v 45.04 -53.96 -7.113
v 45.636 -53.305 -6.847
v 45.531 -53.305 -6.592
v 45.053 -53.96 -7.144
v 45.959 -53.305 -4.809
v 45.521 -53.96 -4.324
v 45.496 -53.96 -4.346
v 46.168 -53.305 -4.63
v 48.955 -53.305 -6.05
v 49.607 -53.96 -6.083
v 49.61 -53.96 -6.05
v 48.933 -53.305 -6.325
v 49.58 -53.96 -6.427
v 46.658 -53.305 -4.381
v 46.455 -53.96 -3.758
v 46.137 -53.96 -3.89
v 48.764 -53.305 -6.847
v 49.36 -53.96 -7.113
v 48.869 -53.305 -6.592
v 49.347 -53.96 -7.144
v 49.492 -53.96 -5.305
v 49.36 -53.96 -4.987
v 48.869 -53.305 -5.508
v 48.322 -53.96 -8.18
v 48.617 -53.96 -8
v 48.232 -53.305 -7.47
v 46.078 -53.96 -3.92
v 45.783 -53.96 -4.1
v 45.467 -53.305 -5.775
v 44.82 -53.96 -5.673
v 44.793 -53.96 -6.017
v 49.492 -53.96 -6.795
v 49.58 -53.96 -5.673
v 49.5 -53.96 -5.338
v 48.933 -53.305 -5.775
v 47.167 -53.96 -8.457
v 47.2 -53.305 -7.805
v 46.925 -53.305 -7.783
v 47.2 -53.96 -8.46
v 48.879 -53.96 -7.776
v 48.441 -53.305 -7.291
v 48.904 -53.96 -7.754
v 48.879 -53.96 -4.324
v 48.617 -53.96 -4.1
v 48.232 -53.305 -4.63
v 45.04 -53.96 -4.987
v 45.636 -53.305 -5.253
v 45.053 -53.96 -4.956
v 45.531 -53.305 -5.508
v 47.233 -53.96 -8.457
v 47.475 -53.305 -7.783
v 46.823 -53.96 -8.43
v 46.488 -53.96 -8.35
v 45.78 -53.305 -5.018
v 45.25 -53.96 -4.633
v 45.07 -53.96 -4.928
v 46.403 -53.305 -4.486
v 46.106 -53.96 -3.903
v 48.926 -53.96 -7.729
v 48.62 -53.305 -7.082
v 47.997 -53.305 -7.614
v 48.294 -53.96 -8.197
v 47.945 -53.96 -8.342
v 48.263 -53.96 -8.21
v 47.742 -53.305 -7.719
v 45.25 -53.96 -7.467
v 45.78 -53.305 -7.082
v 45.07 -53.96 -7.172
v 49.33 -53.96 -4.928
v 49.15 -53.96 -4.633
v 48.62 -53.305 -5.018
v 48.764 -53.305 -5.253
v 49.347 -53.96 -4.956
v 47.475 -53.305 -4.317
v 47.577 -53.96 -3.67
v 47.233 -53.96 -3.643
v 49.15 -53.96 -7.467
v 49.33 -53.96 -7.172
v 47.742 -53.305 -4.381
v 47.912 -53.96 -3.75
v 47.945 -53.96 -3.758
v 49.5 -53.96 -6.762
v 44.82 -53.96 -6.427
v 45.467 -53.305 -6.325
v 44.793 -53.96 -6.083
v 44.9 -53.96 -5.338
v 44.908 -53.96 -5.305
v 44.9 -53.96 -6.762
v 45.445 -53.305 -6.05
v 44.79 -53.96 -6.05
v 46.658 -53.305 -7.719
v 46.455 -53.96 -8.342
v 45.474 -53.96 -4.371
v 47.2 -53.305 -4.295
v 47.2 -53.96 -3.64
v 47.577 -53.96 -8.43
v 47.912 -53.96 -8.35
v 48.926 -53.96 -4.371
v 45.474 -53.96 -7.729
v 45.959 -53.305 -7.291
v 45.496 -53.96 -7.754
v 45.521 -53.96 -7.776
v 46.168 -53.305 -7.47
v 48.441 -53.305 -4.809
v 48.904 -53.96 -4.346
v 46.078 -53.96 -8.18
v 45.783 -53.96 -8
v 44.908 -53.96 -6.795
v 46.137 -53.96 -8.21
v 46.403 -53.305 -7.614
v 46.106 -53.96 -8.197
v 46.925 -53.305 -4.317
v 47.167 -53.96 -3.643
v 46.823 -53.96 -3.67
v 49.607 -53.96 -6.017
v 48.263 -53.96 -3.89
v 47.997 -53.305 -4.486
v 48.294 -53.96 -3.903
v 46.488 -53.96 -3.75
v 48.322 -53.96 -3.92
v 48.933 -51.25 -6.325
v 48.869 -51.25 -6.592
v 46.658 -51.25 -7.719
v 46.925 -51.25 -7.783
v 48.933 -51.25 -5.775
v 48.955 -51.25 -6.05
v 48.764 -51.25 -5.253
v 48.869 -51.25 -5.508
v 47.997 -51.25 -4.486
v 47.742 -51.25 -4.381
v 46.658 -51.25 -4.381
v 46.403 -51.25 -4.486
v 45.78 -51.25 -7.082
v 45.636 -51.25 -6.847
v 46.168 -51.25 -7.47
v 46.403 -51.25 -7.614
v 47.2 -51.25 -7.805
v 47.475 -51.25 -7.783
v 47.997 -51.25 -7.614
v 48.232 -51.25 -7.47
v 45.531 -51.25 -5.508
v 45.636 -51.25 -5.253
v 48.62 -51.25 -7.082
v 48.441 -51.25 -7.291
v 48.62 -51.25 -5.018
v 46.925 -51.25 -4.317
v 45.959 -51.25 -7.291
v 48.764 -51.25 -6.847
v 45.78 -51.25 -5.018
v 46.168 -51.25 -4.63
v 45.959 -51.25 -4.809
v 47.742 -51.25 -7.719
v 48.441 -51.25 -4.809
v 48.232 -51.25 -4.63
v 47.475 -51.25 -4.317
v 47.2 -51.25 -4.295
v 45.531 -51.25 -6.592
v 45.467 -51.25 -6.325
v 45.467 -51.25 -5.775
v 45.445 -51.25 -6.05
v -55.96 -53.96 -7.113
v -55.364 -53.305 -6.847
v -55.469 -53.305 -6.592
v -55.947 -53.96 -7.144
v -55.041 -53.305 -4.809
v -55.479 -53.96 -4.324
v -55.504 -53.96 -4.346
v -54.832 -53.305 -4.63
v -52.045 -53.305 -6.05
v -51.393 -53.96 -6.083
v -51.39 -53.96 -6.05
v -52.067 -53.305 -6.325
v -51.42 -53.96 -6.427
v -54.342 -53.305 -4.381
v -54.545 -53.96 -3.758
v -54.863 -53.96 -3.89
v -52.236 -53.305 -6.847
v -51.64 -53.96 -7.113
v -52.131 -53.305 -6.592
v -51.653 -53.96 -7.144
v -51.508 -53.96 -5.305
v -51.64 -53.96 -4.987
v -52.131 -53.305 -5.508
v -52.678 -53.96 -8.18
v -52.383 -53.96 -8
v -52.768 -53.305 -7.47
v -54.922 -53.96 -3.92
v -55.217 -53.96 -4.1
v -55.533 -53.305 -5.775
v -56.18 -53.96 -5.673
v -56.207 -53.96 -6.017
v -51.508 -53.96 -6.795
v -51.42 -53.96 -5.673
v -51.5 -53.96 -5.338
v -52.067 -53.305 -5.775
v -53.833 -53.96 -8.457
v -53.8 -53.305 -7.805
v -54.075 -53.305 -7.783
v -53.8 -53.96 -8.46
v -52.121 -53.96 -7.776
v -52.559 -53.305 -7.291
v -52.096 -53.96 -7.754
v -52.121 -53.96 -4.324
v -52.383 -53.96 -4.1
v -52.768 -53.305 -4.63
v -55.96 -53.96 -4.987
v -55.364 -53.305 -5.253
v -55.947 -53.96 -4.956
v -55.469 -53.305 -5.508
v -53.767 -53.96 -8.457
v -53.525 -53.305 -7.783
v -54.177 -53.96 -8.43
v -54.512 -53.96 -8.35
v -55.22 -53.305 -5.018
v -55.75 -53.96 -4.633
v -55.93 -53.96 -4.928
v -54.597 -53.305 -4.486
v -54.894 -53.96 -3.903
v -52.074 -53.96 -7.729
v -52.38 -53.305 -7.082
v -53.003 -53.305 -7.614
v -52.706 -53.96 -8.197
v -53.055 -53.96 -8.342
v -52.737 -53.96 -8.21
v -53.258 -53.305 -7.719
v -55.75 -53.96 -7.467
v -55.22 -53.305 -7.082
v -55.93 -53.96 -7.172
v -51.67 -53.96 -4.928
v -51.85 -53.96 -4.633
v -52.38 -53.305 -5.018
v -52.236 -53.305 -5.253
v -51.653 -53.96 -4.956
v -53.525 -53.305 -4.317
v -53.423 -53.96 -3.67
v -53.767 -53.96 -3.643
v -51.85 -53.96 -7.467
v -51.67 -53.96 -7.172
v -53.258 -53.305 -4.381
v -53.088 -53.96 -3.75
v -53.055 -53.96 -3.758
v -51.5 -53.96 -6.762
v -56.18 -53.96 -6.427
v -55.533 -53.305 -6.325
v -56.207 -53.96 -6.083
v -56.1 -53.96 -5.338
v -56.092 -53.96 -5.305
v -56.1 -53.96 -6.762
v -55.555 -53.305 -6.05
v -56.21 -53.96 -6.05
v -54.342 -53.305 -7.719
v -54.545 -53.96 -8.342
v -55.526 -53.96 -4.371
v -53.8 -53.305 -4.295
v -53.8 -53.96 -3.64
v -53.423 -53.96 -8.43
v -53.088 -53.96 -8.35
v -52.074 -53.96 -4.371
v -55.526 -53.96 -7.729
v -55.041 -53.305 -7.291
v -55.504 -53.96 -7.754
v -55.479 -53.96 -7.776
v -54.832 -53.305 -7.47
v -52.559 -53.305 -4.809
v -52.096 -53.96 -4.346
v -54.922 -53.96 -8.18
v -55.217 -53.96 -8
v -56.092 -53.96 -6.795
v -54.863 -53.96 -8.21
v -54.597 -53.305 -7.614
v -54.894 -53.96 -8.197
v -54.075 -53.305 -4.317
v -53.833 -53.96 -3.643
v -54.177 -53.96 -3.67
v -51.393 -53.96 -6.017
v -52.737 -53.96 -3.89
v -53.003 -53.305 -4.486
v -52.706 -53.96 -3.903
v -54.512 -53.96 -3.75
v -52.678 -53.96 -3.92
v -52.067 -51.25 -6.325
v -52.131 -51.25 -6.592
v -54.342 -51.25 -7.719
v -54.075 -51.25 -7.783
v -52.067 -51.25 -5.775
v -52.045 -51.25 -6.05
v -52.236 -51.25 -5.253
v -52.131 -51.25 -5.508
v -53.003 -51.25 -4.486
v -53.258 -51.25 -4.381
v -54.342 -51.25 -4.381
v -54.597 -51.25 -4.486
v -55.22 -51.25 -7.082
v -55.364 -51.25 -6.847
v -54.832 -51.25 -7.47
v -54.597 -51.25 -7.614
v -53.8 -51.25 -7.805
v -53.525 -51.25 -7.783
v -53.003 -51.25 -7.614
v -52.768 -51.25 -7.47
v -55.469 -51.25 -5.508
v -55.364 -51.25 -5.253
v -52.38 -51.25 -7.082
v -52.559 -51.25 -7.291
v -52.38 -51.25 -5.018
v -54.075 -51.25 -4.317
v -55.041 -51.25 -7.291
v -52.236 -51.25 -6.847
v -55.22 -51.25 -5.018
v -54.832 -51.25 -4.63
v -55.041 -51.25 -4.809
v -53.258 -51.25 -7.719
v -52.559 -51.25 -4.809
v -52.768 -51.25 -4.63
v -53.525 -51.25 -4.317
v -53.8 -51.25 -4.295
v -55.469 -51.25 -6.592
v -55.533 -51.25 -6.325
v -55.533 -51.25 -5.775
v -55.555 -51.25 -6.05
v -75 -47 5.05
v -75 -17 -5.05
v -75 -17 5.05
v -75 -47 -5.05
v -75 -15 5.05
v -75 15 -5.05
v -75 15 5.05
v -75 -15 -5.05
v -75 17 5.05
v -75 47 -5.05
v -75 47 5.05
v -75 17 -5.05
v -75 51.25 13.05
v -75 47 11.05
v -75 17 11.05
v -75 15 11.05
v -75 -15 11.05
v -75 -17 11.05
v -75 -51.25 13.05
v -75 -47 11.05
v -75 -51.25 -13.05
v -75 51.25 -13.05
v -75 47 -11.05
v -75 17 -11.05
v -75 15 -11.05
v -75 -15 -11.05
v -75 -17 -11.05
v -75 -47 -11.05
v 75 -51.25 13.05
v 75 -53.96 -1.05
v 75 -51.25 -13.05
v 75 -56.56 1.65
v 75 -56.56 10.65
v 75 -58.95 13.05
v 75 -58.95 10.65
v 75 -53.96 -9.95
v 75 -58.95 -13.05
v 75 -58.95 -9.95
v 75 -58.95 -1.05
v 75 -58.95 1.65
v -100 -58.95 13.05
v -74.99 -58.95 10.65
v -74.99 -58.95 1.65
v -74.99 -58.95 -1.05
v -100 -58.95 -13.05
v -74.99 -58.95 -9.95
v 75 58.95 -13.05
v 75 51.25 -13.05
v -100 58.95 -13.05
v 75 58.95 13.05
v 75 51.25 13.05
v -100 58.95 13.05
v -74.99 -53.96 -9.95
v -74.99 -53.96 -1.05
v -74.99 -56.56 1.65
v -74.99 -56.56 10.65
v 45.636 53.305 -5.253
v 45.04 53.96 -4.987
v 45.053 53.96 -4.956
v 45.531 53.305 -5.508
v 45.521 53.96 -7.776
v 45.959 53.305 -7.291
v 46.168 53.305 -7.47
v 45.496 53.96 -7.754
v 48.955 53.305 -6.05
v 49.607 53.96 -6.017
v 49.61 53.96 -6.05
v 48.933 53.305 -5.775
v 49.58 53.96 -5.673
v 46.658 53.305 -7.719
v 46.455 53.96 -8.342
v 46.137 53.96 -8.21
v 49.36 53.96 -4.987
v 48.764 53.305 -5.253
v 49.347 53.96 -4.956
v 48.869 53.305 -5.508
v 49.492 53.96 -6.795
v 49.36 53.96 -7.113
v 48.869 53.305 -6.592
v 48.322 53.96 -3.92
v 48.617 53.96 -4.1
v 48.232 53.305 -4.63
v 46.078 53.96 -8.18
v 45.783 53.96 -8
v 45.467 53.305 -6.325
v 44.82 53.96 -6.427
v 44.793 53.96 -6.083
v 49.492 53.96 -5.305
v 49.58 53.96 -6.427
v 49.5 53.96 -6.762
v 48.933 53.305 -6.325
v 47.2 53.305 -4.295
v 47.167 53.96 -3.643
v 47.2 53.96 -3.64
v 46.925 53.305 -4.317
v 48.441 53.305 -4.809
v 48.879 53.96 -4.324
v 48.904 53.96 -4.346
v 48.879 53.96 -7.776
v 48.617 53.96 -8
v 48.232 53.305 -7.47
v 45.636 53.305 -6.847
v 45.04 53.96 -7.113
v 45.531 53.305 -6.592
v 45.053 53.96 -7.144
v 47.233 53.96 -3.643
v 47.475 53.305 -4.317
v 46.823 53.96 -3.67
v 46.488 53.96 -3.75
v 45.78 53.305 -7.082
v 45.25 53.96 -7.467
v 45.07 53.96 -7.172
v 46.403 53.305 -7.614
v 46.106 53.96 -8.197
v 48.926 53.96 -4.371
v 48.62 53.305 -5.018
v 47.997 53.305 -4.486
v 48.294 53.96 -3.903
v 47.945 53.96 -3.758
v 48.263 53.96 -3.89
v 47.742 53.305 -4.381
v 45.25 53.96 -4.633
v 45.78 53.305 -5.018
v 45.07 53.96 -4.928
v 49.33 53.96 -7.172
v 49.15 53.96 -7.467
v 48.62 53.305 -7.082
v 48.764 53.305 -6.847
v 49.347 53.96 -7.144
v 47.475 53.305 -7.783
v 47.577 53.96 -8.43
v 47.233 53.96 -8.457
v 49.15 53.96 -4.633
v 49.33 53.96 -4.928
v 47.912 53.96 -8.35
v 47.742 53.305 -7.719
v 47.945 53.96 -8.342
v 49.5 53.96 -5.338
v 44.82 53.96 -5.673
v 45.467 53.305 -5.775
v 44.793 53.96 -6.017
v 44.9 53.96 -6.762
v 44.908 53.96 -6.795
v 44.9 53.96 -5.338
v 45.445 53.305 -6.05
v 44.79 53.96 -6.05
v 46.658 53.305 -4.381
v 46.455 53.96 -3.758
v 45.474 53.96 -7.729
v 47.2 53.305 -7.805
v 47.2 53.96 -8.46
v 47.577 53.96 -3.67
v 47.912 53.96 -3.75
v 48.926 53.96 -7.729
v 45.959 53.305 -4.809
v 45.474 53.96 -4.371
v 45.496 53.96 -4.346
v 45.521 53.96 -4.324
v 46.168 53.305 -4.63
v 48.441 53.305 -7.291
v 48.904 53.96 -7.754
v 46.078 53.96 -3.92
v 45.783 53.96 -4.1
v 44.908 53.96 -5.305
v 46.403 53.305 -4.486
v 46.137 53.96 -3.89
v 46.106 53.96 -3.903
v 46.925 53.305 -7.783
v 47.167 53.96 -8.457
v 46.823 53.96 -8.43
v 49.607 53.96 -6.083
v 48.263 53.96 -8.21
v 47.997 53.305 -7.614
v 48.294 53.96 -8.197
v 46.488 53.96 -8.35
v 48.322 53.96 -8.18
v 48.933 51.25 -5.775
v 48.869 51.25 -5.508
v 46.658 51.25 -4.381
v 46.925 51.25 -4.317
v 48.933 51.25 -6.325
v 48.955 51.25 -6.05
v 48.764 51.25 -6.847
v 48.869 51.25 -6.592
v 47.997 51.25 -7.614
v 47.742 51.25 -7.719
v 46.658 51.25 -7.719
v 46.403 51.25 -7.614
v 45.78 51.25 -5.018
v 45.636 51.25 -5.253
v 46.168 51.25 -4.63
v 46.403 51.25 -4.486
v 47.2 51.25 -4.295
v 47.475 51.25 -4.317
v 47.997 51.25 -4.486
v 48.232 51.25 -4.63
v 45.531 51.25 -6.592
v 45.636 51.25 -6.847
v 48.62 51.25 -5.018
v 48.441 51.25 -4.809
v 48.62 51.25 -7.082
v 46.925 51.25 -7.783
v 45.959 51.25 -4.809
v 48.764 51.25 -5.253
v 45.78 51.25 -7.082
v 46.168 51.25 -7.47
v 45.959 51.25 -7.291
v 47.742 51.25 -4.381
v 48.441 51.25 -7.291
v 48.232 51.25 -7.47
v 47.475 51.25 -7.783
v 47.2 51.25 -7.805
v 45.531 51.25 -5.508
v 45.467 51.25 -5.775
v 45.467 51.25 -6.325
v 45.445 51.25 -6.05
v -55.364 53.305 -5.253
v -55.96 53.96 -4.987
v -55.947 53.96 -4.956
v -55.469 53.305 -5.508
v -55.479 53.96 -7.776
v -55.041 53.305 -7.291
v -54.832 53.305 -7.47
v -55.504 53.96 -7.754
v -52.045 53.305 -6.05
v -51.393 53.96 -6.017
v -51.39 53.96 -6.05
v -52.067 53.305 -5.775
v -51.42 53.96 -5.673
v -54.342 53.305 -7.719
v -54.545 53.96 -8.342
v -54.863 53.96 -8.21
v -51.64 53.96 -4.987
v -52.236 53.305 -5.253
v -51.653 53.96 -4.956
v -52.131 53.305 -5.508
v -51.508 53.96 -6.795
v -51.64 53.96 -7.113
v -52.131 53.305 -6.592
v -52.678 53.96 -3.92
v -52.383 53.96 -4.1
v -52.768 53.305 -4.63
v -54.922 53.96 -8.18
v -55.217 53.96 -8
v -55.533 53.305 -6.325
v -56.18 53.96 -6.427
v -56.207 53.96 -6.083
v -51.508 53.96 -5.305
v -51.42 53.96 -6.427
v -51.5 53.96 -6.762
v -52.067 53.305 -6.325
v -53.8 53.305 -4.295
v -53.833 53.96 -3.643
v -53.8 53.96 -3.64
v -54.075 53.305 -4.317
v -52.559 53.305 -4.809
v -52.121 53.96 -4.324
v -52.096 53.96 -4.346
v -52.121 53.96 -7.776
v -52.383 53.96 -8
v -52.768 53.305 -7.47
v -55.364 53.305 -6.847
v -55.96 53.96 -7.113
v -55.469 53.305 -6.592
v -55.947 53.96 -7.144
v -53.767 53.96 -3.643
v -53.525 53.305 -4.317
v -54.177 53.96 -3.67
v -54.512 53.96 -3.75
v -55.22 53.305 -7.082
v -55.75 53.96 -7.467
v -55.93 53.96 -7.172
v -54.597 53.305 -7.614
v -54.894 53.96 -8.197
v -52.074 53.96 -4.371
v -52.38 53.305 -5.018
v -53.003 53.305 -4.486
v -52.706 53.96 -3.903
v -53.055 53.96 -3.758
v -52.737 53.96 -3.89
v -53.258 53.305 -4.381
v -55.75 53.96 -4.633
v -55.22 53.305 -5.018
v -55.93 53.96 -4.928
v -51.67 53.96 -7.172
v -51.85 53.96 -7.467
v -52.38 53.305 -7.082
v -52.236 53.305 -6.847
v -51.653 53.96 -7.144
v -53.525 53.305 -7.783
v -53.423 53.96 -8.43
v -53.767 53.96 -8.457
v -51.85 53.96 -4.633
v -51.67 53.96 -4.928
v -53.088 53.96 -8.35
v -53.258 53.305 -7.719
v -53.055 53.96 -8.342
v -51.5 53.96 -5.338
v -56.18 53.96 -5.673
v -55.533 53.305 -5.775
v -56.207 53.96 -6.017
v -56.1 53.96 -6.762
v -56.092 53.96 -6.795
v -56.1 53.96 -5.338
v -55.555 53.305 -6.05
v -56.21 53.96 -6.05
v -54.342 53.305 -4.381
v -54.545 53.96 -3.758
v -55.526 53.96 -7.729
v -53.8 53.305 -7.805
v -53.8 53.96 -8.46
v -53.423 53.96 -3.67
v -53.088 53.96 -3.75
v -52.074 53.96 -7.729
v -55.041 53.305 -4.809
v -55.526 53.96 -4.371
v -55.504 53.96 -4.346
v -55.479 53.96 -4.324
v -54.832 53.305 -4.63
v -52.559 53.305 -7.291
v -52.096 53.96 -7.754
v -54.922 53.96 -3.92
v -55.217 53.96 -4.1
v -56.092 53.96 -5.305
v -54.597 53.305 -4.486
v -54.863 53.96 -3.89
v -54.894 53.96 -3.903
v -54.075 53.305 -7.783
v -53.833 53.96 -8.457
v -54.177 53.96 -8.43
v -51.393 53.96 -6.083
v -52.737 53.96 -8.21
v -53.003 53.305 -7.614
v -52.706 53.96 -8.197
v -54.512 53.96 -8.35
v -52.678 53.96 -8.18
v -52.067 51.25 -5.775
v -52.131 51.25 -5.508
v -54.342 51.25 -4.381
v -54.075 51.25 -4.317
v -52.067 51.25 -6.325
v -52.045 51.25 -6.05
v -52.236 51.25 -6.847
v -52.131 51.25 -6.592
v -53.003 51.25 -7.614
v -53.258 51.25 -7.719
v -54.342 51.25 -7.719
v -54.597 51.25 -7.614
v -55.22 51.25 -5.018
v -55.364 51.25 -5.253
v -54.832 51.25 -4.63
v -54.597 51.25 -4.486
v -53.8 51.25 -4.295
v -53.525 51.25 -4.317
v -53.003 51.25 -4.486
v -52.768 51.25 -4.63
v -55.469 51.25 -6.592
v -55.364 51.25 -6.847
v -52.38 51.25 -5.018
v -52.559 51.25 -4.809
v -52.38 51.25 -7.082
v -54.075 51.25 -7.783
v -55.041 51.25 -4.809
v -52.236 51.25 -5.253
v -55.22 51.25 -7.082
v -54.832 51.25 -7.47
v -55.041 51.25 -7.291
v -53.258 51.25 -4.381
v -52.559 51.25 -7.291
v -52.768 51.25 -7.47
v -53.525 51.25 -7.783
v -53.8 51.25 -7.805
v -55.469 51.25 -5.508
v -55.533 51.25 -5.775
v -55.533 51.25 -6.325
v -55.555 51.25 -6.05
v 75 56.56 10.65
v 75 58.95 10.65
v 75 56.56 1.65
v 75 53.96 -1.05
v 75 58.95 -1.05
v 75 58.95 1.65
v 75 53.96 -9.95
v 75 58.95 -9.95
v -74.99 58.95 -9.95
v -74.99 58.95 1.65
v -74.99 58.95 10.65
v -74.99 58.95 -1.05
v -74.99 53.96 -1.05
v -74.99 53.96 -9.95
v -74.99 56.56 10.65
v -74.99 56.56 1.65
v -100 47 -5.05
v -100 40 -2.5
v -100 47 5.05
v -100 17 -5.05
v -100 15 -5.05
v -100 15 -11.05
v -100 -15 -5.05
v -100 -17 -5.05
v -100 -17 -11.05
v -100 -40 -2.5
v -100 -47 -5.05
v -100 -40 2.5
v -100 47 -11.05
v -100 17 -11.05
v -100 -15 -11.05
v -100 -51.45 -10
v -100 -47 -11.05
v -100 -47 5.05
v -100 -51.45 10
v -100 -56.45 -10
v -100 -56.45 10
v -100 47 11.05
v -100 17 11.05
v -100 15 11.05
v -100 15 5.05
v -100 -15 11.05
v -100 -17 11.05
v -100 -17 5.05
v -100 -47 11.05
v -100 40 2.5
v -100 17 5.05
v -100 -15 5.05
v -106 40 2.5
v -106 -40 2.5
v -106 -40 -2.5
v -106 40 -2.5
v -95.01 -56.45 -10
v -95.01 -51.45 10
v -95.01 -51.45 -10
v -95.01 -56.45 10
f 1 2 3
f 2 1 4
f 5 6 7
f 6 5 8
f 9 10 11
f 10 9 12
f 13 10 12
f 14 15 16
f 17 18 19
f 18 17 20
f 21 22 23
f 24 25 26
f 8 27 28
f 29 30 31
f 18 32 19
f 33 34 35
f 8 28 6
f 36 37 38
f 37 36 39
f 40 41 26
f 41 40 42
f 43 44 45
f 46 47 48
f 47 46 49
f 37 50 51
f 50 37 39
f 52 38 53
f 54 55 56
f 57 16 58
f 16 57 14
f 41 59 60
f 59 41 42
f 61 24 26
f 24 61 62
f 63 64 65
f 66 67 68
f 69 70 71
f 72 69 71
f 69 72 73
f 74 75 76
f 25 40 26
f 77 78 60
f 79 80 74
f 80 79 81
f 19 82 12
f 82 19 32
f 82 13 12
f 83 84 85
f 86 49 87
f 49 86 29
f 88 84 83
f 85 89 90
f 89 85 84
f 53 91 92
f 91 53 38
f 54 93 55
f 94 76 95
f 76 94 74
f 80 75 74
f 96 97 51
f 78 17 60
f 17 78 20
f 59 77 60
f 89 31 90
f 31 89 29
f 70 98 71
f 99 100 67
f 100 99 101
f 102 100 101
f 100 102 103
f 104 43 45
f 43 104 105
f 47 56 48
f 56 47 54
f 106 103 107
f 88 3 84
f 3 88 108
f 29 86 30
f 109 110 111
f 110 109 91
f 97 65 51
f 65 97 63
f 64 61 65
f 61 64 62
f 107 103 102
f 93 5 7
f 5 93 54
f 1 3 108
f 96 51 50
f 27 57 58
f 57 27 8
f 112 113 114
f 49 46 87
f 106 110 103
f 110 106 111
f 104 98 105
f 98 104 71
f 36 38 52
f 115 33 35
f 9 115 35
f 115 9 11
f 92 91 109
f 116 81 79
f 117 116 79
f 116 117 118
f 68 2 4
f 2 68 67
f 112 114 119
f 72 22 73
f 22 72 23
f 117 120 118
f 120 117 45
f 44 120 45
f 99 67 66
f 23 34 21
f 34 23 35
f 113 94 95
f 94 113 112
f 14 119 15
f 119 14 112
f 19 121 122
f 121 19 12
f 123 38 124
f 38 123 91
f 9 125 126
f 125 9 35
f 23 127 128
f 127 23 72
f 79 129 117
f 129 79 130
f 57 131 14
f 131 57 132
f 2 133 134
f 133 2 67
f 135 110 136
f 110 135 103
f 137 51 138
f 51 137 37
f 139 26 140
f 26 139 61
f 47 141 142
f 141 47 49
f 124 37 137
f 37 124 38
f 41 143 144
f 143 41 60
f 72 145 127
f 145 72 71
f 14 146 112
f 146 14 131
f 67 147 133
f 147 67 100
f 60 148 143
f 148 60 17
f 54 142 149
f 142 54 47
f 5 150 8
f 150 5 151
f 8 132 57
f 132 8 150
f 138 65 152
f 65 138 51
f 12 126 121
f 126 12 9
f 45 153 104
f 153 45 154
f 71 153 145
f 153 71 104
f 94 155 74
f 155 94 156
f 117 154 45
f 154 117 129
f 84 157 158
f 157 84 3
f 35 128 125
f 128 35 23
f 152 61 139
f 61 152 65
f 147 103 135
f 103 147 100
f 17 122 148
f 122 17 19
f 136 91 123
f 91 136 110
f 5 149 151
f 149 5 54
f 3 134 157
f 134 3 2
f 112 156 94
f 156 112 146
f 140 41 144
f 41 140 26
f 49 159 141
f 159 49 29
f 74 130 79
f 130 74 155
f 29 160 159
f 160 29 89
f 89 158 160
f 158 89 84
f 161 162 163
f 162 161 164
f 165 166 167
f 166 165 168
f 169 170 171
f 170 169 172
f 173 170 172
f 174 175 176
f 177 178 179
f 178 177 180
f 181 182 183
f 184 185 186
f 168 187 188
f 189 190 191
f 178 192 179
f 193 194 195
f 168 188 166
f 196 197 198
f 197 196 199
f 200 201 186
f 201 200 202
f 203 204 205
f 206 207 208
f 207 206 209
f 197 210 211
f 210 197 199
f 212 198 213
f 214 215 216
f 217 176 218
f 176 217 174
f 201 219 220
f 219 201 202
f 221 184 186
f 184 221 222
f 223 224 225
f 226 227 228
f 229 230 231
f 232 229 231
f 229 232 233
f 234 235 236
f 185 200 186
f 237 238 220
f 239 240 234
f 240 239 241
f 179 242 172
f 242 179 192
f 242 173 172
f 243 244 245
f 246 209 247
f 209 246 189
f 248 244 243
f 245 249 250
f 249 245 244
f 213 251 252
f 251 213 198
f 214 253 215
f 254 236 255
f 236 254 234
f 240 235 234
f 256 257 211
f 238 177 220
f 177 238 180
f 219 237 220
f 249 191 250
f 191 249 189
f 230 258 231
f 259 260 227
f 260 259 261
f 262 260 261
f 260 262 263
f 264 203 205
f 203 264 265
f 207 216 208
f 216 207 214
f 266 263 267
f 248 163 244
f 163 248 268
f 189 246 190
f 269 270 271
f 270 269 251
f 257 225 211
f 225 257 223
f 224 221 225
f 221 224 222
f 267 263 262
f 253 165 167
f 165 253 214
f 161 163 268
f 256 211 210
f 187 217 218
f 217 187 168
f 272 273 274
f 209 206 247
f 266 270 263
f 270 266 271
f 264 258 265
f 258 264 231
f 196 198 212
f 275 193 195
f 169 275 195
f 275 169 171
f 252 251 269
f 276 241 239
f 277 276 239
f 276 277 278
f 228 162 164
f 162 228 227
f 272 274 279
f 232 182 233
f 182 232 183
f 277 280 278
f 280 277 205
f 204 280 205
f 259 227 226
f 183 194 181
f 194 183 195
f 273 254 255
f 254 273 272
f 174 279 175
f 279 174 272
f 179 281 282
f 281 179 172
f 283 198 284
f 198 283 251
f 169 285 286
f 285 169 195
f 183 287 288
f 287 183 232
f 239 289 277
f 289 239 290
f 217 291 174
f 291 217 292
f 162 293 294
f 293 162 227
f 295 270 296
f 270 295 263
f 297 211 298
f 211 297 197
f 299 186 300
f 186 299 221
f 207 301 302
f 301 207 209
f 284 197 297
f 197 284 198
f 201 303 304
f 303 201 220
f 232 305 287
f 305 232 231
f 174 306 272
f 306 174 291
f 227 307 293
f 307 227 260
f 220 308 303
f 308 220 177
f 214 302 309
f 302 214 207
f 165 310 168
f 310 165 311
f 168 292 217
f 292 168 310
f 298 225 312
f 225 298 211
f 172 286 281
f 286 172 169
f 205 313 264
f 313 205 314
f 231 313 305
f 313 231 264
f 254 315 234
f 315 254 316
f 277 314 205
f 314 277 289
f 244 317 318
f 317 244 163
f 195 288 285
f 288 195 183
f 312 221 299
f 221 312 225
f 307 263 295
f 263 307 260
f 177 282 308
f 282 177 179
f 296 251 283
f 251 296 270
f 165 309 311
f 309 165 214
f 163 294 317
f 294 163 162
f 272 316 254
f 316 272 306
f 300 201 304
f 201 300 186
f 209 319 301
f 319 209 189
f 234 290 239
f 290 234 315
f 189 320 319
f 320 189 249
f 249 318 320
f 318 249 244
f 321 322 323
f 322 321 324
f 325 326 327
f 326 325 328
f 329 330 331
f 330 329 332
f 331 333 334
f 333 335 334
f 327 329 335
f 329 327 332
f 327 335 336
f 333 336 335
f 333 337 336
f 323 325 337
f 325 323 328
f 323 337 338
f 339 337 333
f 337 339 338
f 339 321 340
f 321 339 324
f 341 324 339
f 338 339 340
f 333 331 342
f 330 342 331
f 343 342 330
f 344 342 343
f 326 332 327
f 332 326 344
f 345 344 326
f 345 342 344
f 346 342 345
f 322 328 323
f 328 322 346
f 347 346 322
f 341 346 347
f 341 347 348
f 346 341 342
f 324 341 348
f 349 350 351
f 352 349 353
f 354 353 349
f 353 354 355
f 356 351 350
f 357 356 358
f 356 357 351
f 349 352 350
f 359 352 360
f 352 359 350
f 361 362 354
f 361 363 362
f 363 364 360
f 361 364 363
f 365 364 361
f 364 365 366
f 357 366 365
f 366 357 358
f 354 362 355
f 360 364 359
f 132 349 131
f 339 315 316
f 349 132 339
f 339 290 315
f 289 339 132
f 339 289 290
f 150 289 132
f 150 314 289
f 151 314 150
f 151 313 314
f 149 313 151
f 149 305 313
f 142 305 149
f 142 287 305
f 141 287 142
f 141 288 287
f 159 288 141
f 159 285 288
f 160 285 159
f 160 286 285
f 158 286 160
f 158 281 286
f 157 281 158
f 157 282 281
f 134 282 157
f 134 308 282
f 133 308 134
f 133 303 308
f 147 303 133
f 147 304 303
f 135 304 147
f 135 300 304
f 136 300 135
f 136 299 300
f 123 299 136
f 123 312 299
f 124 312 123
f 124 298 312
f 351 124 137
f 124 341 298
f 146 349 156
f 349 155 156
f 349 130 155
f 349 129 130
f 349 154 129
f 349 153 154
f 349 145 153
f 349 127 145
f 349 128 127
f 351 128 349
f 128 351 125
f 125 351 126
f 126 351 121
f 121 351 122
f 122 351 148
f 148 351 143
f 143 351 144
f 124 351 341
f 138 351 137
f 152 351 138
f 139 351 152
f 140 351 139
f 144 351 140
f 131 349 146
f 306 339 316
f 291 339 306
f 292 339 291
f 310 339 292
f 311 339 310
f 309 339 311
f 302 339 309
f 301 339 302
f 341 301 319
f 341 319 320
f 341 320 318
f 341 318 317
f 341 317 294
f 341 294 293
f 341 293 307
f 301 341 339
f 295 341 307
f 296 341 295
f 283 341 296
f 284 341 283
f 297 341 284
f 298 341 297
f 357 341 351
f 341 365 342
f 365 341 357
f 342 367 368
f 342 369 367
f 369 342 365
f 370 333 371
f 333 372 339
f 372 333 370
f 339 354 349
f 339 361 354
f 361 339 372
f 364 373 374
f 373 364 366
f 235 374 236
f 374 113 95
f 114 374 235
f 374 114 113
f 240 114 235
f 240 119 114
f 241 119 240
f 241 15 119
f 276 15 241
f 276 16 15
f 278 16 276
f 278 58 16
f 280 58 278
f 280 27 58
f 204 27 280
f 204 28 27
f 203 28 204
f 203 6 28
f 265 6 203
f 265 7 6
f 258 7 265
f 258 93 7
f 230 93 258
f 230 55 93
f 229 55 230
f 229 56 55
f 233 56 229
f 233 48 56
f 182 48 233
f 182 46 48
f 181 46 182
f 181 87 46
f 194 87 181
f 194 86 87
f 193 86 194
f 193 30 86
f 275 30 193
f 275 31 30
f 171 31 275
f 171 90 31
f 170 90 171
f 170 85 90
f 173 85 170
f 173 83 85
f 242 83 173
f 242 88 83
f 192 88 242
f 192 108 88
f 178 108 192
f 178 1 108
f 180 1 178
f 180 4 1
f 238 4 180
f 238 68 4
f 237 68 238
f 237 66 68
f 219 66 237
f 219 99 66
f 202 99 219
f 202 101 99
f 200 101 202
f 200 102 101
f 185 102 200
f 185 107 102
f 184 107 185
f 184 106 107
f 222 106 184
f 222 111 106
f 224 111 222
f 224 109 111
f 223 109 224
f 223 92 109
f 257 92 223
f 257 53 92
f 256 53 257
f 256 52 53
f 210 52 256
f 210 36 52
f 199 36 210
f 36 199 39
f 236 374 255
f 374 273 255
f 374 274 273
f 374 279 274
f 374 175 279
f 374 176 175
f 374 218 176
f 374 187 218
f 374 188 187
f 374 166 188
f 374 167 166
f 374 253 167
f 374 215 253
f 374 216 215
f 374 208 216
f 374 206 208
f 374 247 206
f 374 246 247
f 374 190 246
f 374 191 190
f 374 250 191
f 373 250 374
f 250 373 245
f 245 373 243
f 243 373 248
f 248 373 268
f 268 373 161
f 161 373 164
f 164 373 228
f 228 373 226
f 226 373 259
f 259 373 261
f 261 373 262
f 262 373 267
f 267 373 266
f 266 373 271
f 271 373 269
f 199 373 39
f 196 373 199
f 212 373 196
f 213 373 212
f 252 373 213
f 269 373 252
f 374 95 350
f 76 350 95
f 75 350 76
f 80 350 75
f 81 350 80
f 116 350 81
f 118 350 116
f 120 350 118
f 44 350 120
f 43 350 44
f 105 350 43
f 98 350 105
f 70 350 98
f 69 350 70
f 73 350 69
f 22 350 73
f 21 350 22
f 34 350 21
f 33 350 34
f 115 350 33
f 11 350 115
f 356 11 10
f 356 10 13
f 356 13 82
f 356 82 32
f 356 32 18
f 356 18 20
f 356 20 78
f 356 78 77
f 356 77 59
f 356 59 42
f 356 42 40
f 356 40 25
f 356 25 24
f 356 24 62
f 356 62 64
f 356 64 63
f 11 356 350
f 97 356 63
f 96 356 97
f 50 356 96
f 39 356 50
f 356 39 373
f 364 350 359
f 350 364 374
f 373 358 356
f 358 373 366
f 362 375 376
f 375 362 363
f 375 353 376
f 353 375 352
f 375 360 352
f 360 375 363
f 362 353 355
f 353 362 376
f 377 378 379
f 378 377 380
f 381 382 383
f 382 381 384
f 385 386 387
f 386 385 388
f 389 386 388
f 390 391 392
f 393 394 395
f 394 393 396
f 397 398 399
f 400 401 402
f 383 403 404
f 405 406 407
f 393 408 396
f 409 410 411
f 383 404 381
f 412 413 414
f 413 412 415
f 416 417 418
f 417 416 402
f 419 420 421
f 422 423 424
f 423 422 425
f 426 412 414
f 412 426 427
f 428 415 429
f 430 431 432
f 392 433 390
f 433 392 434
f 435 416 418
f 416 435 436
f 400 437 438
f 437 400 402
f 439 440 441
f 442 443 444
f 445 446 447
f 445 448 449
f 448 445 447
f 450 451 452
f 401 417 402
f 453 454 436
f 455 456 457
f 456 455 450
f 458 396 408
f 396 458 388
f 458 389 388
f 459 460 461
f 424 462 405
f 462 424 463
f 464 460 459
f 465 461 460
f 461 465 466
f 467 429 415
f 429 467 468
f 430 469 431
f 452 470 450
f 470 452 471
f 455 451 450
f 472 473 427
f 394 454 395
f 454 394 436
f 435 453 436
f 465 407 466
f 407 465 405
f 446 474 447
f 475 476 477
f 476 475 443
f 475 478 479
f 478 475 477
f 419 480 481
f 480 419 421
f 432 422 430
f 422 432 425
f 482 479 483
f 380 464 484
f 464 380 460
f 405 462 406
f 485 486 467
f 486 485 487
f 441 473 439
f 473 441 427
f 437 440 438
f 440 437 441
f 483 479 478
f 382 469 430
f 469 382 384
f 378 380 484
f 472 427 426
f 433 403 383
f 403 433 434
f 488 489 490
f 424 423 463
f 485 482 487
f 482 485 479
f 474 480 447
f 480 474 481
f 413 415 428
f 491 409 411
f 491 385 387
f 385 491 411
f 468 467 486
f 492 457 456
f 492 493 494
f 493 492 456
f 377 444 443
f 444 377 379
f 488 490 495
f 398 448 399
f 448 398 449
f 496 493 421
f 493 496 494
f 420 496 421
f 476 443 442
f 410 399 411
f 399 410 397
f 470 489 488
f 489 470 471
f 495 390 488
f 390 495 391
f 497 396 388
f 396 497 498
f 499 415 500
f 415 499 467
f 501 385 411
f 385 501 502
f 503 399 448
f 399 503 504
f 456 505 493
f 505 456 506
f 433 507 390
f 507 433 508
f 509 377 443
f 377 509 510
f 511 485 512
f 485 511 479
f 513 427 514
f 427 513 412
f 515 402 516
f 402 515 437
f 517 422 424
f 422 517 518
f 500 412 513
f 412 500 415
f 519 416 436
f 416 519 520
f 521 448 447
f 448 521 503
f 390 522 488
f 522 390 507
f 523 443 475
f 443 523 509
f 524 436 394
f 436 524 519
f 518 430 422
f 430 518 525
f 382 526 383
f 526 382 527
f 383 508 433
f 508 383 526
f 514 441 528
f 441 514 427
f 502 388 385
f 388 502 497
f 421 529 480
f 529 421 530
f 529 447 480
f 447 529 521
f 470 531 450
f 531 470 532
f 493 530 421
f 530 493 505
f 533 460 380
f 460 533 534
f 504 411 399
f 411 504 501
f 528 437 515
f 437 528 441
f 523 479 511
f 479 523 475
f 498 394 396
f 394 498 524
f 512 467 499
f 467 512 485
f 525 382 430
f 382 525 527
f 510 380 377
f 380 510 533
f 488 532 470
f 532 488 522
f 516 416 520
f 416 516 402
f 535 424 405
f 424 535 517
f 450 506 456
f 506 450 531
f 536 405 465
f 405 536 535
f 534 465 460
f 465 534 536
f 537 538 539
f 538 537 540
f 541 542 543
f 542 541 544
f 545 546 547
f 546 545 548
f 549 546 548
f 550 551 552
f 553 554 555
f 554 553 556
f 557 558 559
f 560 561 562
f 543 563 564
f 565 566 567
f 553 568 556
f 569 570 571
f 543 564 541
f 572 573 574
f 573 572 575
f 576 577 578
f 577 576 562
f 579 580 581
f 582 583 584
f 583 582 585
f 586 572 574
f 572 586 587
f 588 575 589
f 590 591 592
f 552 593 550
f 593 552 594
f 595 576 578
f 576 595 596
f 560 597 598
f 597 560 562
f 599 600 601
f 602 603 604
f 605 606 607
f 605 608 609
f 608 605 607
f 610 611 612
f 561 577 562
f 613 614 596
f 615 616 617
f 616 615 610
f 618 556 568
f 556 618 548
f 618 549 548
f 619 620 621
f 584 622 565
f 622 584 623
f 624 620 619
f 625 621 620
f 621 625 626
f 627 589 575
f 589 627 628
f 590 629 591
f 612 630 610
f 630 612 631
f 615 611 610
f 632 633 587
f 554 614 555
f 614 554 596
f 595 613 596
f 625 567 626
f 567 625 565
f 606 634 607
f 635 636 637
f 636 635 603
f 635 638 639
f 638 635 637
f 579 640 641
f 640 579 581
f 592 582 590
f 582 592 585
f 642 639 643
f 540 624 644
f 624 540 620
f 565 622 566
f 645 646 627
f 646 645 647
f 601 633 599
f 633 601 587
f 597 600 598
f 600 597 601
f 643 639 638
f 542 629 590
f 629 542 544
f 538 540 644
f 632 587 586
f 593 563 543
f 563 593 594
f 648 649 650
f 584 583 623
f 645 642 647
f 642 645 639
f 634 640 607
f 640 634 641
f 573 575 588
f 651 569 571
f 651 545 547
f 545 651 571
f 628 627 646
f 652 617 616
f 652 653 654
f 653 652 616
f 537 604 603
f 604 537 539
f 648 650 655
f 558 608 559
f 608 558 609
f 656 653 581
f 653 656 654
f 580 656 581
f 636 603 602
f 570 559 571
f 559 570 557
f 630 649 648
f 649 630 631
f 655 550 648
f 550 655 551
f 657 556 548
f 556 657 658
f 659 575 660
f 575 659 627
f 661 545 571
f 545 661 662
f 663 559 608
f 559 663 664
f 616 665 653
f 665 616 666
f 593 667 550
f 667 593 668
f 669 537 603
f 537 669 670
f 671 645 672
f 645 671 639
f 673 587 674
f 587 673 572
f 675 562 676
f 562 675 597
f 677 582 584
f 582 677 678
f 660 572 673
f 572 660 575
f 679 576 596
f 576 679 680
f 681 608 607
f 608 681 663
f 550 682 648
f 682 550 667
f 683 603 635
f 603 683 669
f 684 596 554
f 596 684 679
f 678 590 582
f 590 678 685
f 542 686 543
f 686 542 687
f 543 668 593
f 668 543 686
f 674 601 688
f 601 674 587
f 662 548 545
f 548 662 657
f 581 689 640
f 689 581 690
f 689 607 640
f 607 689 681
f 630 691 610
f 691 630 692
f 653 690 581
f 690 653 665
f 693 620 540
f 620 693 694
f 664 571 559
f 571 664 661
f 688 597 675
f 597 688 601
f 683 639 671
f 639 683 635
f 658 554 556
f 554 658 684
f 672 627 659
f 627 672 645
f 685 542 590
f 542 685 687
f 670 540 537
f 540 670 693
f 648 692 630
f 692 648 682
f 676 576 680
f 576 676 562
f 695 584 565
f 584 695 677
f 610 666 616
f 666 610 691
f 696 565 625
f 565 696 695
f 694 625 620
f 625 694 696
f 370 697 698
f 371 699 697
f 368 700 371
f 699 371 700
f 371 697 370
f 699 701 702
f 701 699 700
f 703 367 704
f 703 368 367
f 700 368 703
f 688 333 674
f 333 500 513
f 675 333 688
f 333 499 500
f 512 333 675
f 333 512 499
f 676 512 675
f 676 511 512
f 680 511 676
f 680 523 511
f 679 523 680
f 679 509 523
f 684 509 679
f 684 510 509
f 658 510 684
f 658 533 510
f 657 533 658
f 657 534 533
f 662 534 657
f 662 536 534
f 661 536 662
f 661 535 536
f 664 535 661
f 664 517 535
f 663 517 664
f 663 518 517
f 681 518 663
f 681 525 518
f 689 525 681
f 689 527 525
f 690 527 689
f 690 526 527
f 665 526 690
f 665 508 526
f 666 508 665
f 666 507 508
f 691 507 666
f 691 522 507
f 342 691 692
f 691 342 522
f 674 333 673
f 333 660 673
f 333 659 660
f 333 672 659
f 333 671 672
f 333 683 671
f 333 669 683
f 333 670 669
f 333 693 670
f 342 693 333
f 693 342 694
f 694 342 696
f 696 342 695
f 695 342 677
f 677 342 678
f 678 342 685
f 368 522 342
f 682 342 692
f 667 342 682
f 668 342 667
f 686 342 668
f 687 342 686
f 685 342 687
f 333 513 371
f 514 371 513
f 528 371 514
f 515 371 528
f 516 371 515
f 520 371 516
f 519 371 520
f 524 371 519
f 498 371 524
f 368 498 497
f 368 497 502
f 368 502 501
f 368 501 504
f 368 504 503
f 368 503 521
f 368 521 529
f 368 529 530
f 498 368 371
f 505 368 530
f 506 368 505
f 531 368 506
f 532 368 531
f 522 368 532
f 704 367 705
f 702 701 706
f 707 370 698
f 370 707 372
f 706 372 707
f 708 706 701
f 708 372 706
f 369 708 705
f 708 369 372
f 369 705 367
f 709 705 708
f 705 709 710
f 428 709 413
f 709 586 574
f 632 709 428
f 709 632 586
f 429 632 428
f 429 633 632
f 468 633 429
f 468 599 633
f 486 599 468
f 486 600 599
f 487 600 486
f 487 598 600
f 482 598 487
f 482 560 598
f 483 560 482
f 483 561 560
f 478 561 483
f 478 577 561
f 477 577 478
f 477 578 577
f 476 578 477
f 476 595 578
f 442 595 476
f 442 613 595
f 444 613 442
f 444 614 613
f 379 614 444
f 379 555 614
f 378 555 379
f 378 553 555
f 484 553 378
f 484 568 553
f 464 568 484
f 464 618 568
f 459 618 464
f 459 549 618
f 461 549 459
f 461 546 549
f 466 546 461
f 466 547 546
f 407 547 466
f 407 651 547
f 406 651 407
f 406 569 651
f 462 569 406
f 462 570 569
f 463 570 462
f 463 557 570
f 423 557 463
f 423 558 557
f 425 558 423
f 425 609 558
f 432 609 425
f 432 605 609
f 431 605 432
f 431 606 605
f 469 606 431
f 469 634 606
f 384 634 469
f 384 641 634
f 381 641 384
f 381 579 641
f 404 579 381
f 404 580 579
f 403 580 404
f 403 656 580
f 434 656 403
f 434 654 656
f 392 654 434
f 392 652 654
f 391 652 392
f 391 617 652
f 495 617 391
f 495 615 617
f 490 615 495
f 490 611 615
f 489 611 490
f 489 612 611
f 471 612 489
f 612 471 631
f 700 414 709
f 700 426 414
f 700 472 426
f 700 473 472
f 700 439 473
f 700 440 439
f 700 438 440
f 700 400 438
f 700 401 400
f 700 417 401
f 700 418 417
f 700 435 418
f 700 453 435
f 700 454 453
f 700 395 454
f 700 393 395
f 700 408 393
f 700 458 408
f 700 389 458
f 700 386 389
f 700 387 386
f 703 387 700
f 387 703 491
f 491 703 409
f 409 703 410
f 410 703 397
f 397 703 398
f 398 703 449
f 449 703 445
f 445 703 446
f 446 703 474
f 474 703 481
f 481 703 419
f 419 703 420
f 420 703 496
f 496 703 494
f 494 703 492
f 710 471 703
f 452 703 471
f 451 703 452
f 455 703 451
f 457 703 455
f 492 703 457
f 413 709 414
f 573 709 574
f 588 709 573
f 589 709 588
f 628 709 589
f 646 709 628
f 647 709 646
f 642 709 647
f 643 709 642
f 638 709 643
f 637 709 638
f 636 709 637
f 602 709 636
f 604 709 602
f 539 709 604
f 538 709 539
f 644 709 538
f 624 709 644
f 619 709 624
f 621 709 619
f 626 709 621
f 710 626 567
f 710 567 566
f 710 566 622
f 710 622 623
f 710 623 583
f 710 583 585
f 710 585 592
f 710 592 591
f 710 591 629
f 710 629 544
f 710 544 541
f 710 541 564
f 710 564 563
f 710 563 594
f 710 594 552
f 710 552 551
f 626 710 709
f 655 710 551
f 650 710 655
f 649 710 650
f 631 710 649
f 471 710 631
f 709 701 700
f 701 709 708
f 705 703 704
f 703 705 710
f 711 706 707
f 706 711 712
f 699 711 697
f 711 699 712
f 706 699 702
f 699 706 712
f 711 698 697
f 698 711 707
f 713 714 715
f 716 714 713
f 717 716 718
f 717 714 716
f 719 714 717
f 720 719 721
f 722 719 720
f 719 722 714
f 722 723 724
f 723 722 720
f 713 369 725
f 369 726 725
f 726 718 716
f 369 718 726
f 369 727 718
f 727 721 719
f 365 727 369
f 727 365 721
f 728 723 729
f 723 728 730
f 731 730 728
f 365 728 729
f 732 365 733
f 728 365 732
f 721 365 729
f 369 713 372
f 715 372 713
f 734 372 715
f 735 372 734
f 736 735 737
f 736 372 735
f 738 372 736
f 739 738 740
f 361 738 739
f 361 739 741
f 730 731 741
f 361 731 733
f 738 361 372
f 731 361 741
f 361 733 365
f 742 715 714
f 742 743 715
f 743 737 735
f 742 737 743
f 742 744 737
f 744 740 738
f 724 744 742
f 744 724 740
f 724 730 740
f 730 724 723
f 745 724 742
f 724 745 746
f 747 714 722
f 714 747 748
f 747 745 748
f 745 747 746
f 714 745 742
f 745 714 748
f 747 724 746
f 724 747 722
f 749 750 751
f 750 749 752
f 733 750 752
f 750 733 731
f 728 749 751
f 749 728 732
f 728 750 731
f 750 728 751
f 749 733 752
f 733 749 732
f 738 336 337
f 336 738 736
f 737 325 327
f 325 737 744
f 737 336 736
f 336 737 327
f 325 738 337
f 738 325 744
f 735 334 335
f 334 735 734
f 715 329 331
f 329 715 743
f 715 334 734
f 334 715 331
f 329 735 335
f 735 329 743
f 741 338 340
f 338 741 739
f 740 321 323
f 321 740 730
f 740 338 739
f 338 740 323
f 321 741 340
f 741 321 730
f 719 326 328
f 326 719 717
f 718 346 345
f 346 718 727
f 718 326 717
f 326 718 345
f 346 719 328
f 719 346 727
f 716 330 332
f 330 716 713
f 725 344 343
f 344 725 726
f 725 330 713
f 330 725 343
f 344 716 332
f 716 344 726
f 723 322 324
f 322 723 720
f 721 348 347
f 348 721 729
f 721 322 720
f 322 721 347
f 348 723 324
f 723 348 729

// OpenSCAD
// Matthew Sparks
// 2019-09-08
//
// SATA/SAS drive tray bracket for SC-743
// replaces Supermicro MCP-220-00092-0B
// units in 1mm

railLength      =   150; // Length of rails
railWidth       =   26.1; // Width of rails
railThickness   =   7.7; // Thickness of rails

railGrooveWidth     =   8.9; // Width of main groove
railGrooveOffset    =   3.1; // Distance of main groove from bottom
railGrooveDepth     =   5.0; // Depth of main groove
railGrooveLength    =   railLength; // Length of main groove

railOtherGrooveWidth    =   9.0; // Width of secondary groove
railOtherGrooveOffset   =   2.4; // Distance of secondary groove from top
railOtherGrooveDepth    =   2.4; // Depth of secondary groove

railToRailInside    =   102.5; // Rail to rail spacing, inside distance

frontDepth      =   25.0; // Depth of front section

frontSlotLength =   30.0; // Length of front airflow slots
frontSlotWidth  =   6.0; // Width of front airflow slots

frontHandleLength   =   80.0; // Length of front handle
frontHandleWidth    =   5.0; // Width of front handle
frontHandleDepth    =   6.0; // Depth of front handle

frontSlotTopOffset      =   2.0; // Distance from top of airflow slots
frontSlotBottomOffset   =   2.0; // Distance from bottom of airflow slots
frontSlotSpacing        =   2.0; // Distance between edges of airflow slots

lightPipeSlotWidth      =   5.0; // Width of divot for light pipe
lightPipeSlotLength     =   20.0; // Length of divot for light pipe 
lightPipeSlotDepth      =   5.0; // Depth of divot for light pipe
lightPipeSlotOffset     =   7.5; // Offset of divot for light pipe

screwHeadDiameter   =   5.0; // Screw head diameter
screwDiameter       =   3.51; // 6-32 screw size
screwFirstToRear    =   27.8; // Distance of rear screws from rear
screwSecondToRear   =   128.8; // Distance of front screws from rear
screwCenterToBottom =   7.0; // Distance of screws from bottom of rails

$fn = 40;

union(){
    // left rail
    difference() {
        // main block
        translate([0,-((railToRailInside+railThickness)/2),0]) {
            rotate([90,0,0]) {
                cube([railLength,railWidth,railThickness],true);
            }
        }
        // main groove
        translate([((railLength-railGrooveLength)/2+0.01),-((((railToRailInside-railGrooveDepth)/2)+railThickness)+0.01),-((railWidth-railGrooveWidth)/2)+railGrooveOffset]) {
            rotate([90,0,0]) {
                cube([railGrooveLength,railGrooveWidth,railGrooveDepth],true);
            }
        }
        // other groove
        translate([((railLength-railGrooveLength)/2+0.01),-((((railToRailInside-railOtherGrooveDepth)/2)+railThickness)+0.01),((railWidth-railOtherGrooveWidth)/2)-railOtherGrooveOffset]) {
            rotate([90,0,0]) {
                cube([railGrooveLength,railOtherGrooveWidth,railOtherGrooveDepth],true);
            }
        }
        // rear screwhole
        translate([(railLength/2)-screwFirstToRear,-((railToRailInside+(railThickness-railGrooveDepth))/2-0.4),-(railWidth/2)+screwCenterToBottom]) {
            union(){
                translate([0,-((railThickness-railGrooveDepth+1)-((screwHeadDiameter-screwDiameter)/2))/2,0]){
                    rotate([270,0,0]) {
                        cylinder((screwHeadDiameter-screwDiameter)/2,screwHeadDiameter/2,screwDiameter/2,true);
                    }
                }
                rotate([90,0,0]) {
                    cylinder(railThickness-railGrooveDepth+1,screwDiameter/2,screwDiameter/2,true);
                }
            }
        }
        // front screwhole
        translate([(railLength/2)-screwSecondToRear,-((railToRailInside+(railThickness-railGrooveDepth))/2-0.4),-(railWidth/2)+screwCenterToBottom]) {
            union(){
                translate([0,-((railThickness-railGrooveDepth+1)-((screwHeadDiameter-screwDiameter)/2))/2,0]){
                    rotate([270,0,0]) {
                        cylinder((screwHeadDiameter-screwDiameter)/2,screwHeadDiameter/2,screwDiameter/2,true);
                    }
                }
                rotate([90,0,0]) {
                    cylinder(railThickness-railGrooveDepth+1,screwDiameter/2,screwDiameter/2,true);
                }
            }
        }
    }
    // right rail
    difference() {
        // main block
        translate([0,(railToRailInside+railThickness)/2,0]) {
            rotate([90,0,0]) {
                cube([railLength,railWidth,railThickness],true);
            }
        }
        // main groove
        translate([((railLength-railGrooveLength)/2+0.01),((((railToRailInside-railGrooveDepth)/2)+railThickness)+0.01),-((railWidth-railGrooveWidth)/2)+railGrooveOffset]) {
            rotate([90,0,0]) {
                cube([railGrooveLength,railGrooveWidth,railGrooveDepth],true);
            }
        }
        // other groove
        translate([((railLength-railGrooveLength)/2+0.01),((((railToRailInside-railOtherGrooveDepth)/2)+railThickness)+0.01),((railWidth-railOtherGrooveWidth)/2)-railOtherGrooveOffset]) {
            rotate([90,0,0]) {
                cube([railGrooveLength,railOtherGrooveWidth,railOtherGrooveDepth],true);
            }
        }
        // rear screwhole
        translate([(railLength/2)-screwFirstToRear,((railToRailInside+(railThickness-railGrooveDepth))/2-0.4),-(railWidth/2)+screwCenterToBottom]) {
            rotate([180,0,0]) {
                union(){
                    translate([0,-((railThickness-railGrooveDepth+1)-((screwHeadDiameter-screwDiameter)/2))/2,0]){
                        rotate([270,0,0]) {
                            cylinder((screwHeadDiameter-screwDiameter)/2,screwHeadDiameter/2,screwDiameter/2,true);
                        }
                    }
                    rotate([90,0,0]) {
                        cylinder(railThickness-railGrooveDepth+1,screwDiameter/2,screwDiameter/2,true);
                    }
                }
            }
        }
        // front screwhole
        translate([(railLength/2)-screwSecondToRear,((railToRailInside+(railThickness-railGrooveDepth))/2-0.4),-(railWidth/2)+screwCenterToBottom]) {
            rotate([180,0,0]) {
                union(){
                    translate([0,-((railThickness-railGrooveDepth+1)-((screwHeadDiameter-screwDiameter)/2))/2,0]){
                        rotate([270,0,0]) {
                            cylinder((screwHeadDiameter-screwDiameter)/2,screwHeadDiameter/2,screwDiameter/2,true);
                        }
                    }
                    rotate([90,0,0]) {
                        cylinder(railThickness-railGrooveDepth+1,screwDiameter/2,screwDiameter/2,true);
                    }
                }
            }
        }
    }
    
    // front
    difference(){
        // main piece and handle
        union(){
            translate([-((railLength+frontDepth)/2),0,0]) {
                rotate([0,0,0]) {
                    cube([frontDepth,railToRailInside+railThickness*2,railWidth],true);
                }
            }
            translate([-((railLength+frontHandleDepth)/2+frontDepth),0,0]) {
                rotate([0,0,0]) {
                    cube([frontHandleDepth,frontHandleLength,frontHandleWidth],true);
                }
            }
        }
        // slot for light pipes on front cover
        translate([-((railLength-lightPipeSlotDepth)/2+frontDepth+0.01),-(railToRailInside+lightPipeSlotWidth)/2-railThickness+lightPipeSlotOffset,0]) {
            rotate([0,0,0]) {
                cube([lightPipeSlotDepth,lightPipeSlotWidth,lightPipeSlotLength],true);
            }
        }
        // top slots
        translate([-((railLength+frontDepth)/2),0,(((railWidth-frontSlotWidth)/2)-frontSlotTopOffset)]) {
            rotate([0,0,0]) {
                cube([frontDepth+1,frontSlotLength,frontSlotWidth],true);
            }
        }
        translate([-((railLength+frontDepth)/2),frontSlotLength+frontSlotSpacing,(((railWidth-frontSlotWidth)/2)-frontSlotTopOffset)]) {
            rotate([0,0,0]) {
                cube([frontDepth+1,frontSlotLength,frontSlotWidth],true);
            }
        }
        translate([-((railLength+frontDepth)/2),-(frontSlotLength+frontSlotSpacing),(((railWidth-frontSlotWidth)/2)-frontSlotTopOffset)]) {
            rotate([0,0,0]) {
                cube([frontDepth+1,frontSlotLength,frontSlotWidth],true);
            }
        }
        // bottom slots
        translate([-((railLength+frontDepth)/2),0,-(((railWidth-frontSlotWidth)/2)-frontSlotBottomOffset)]) {
            rotate([0,0,0]) {
                cube([frontDepth+1,frontSlotLength,frontSlotWidth],true);
            }
        }
        translate([-((railLength+frontDepth)/2),frontSlotLength+frontSlotSpacing,-(((railWidth-frontSlotWidth)/2)-frontSlotBottomOffset)]) {
            rotate([0,0,0]) {
                cube([frontDepth+1,frontSlotLength,frontSlotWidth],true);
            }
        }
        translate([-((railLength+frontDepth)/2),-(frontSlotLength+frontSlotSpacing),-(((railWidth-frontSlotWidth)/2)-frontSlotBottomOffset)]) {
            rotate([0,0,0]) {
                cube([frontDepth+1,frontSlotLength,frontSlotWidth],true);
            }
        }
    }
}
